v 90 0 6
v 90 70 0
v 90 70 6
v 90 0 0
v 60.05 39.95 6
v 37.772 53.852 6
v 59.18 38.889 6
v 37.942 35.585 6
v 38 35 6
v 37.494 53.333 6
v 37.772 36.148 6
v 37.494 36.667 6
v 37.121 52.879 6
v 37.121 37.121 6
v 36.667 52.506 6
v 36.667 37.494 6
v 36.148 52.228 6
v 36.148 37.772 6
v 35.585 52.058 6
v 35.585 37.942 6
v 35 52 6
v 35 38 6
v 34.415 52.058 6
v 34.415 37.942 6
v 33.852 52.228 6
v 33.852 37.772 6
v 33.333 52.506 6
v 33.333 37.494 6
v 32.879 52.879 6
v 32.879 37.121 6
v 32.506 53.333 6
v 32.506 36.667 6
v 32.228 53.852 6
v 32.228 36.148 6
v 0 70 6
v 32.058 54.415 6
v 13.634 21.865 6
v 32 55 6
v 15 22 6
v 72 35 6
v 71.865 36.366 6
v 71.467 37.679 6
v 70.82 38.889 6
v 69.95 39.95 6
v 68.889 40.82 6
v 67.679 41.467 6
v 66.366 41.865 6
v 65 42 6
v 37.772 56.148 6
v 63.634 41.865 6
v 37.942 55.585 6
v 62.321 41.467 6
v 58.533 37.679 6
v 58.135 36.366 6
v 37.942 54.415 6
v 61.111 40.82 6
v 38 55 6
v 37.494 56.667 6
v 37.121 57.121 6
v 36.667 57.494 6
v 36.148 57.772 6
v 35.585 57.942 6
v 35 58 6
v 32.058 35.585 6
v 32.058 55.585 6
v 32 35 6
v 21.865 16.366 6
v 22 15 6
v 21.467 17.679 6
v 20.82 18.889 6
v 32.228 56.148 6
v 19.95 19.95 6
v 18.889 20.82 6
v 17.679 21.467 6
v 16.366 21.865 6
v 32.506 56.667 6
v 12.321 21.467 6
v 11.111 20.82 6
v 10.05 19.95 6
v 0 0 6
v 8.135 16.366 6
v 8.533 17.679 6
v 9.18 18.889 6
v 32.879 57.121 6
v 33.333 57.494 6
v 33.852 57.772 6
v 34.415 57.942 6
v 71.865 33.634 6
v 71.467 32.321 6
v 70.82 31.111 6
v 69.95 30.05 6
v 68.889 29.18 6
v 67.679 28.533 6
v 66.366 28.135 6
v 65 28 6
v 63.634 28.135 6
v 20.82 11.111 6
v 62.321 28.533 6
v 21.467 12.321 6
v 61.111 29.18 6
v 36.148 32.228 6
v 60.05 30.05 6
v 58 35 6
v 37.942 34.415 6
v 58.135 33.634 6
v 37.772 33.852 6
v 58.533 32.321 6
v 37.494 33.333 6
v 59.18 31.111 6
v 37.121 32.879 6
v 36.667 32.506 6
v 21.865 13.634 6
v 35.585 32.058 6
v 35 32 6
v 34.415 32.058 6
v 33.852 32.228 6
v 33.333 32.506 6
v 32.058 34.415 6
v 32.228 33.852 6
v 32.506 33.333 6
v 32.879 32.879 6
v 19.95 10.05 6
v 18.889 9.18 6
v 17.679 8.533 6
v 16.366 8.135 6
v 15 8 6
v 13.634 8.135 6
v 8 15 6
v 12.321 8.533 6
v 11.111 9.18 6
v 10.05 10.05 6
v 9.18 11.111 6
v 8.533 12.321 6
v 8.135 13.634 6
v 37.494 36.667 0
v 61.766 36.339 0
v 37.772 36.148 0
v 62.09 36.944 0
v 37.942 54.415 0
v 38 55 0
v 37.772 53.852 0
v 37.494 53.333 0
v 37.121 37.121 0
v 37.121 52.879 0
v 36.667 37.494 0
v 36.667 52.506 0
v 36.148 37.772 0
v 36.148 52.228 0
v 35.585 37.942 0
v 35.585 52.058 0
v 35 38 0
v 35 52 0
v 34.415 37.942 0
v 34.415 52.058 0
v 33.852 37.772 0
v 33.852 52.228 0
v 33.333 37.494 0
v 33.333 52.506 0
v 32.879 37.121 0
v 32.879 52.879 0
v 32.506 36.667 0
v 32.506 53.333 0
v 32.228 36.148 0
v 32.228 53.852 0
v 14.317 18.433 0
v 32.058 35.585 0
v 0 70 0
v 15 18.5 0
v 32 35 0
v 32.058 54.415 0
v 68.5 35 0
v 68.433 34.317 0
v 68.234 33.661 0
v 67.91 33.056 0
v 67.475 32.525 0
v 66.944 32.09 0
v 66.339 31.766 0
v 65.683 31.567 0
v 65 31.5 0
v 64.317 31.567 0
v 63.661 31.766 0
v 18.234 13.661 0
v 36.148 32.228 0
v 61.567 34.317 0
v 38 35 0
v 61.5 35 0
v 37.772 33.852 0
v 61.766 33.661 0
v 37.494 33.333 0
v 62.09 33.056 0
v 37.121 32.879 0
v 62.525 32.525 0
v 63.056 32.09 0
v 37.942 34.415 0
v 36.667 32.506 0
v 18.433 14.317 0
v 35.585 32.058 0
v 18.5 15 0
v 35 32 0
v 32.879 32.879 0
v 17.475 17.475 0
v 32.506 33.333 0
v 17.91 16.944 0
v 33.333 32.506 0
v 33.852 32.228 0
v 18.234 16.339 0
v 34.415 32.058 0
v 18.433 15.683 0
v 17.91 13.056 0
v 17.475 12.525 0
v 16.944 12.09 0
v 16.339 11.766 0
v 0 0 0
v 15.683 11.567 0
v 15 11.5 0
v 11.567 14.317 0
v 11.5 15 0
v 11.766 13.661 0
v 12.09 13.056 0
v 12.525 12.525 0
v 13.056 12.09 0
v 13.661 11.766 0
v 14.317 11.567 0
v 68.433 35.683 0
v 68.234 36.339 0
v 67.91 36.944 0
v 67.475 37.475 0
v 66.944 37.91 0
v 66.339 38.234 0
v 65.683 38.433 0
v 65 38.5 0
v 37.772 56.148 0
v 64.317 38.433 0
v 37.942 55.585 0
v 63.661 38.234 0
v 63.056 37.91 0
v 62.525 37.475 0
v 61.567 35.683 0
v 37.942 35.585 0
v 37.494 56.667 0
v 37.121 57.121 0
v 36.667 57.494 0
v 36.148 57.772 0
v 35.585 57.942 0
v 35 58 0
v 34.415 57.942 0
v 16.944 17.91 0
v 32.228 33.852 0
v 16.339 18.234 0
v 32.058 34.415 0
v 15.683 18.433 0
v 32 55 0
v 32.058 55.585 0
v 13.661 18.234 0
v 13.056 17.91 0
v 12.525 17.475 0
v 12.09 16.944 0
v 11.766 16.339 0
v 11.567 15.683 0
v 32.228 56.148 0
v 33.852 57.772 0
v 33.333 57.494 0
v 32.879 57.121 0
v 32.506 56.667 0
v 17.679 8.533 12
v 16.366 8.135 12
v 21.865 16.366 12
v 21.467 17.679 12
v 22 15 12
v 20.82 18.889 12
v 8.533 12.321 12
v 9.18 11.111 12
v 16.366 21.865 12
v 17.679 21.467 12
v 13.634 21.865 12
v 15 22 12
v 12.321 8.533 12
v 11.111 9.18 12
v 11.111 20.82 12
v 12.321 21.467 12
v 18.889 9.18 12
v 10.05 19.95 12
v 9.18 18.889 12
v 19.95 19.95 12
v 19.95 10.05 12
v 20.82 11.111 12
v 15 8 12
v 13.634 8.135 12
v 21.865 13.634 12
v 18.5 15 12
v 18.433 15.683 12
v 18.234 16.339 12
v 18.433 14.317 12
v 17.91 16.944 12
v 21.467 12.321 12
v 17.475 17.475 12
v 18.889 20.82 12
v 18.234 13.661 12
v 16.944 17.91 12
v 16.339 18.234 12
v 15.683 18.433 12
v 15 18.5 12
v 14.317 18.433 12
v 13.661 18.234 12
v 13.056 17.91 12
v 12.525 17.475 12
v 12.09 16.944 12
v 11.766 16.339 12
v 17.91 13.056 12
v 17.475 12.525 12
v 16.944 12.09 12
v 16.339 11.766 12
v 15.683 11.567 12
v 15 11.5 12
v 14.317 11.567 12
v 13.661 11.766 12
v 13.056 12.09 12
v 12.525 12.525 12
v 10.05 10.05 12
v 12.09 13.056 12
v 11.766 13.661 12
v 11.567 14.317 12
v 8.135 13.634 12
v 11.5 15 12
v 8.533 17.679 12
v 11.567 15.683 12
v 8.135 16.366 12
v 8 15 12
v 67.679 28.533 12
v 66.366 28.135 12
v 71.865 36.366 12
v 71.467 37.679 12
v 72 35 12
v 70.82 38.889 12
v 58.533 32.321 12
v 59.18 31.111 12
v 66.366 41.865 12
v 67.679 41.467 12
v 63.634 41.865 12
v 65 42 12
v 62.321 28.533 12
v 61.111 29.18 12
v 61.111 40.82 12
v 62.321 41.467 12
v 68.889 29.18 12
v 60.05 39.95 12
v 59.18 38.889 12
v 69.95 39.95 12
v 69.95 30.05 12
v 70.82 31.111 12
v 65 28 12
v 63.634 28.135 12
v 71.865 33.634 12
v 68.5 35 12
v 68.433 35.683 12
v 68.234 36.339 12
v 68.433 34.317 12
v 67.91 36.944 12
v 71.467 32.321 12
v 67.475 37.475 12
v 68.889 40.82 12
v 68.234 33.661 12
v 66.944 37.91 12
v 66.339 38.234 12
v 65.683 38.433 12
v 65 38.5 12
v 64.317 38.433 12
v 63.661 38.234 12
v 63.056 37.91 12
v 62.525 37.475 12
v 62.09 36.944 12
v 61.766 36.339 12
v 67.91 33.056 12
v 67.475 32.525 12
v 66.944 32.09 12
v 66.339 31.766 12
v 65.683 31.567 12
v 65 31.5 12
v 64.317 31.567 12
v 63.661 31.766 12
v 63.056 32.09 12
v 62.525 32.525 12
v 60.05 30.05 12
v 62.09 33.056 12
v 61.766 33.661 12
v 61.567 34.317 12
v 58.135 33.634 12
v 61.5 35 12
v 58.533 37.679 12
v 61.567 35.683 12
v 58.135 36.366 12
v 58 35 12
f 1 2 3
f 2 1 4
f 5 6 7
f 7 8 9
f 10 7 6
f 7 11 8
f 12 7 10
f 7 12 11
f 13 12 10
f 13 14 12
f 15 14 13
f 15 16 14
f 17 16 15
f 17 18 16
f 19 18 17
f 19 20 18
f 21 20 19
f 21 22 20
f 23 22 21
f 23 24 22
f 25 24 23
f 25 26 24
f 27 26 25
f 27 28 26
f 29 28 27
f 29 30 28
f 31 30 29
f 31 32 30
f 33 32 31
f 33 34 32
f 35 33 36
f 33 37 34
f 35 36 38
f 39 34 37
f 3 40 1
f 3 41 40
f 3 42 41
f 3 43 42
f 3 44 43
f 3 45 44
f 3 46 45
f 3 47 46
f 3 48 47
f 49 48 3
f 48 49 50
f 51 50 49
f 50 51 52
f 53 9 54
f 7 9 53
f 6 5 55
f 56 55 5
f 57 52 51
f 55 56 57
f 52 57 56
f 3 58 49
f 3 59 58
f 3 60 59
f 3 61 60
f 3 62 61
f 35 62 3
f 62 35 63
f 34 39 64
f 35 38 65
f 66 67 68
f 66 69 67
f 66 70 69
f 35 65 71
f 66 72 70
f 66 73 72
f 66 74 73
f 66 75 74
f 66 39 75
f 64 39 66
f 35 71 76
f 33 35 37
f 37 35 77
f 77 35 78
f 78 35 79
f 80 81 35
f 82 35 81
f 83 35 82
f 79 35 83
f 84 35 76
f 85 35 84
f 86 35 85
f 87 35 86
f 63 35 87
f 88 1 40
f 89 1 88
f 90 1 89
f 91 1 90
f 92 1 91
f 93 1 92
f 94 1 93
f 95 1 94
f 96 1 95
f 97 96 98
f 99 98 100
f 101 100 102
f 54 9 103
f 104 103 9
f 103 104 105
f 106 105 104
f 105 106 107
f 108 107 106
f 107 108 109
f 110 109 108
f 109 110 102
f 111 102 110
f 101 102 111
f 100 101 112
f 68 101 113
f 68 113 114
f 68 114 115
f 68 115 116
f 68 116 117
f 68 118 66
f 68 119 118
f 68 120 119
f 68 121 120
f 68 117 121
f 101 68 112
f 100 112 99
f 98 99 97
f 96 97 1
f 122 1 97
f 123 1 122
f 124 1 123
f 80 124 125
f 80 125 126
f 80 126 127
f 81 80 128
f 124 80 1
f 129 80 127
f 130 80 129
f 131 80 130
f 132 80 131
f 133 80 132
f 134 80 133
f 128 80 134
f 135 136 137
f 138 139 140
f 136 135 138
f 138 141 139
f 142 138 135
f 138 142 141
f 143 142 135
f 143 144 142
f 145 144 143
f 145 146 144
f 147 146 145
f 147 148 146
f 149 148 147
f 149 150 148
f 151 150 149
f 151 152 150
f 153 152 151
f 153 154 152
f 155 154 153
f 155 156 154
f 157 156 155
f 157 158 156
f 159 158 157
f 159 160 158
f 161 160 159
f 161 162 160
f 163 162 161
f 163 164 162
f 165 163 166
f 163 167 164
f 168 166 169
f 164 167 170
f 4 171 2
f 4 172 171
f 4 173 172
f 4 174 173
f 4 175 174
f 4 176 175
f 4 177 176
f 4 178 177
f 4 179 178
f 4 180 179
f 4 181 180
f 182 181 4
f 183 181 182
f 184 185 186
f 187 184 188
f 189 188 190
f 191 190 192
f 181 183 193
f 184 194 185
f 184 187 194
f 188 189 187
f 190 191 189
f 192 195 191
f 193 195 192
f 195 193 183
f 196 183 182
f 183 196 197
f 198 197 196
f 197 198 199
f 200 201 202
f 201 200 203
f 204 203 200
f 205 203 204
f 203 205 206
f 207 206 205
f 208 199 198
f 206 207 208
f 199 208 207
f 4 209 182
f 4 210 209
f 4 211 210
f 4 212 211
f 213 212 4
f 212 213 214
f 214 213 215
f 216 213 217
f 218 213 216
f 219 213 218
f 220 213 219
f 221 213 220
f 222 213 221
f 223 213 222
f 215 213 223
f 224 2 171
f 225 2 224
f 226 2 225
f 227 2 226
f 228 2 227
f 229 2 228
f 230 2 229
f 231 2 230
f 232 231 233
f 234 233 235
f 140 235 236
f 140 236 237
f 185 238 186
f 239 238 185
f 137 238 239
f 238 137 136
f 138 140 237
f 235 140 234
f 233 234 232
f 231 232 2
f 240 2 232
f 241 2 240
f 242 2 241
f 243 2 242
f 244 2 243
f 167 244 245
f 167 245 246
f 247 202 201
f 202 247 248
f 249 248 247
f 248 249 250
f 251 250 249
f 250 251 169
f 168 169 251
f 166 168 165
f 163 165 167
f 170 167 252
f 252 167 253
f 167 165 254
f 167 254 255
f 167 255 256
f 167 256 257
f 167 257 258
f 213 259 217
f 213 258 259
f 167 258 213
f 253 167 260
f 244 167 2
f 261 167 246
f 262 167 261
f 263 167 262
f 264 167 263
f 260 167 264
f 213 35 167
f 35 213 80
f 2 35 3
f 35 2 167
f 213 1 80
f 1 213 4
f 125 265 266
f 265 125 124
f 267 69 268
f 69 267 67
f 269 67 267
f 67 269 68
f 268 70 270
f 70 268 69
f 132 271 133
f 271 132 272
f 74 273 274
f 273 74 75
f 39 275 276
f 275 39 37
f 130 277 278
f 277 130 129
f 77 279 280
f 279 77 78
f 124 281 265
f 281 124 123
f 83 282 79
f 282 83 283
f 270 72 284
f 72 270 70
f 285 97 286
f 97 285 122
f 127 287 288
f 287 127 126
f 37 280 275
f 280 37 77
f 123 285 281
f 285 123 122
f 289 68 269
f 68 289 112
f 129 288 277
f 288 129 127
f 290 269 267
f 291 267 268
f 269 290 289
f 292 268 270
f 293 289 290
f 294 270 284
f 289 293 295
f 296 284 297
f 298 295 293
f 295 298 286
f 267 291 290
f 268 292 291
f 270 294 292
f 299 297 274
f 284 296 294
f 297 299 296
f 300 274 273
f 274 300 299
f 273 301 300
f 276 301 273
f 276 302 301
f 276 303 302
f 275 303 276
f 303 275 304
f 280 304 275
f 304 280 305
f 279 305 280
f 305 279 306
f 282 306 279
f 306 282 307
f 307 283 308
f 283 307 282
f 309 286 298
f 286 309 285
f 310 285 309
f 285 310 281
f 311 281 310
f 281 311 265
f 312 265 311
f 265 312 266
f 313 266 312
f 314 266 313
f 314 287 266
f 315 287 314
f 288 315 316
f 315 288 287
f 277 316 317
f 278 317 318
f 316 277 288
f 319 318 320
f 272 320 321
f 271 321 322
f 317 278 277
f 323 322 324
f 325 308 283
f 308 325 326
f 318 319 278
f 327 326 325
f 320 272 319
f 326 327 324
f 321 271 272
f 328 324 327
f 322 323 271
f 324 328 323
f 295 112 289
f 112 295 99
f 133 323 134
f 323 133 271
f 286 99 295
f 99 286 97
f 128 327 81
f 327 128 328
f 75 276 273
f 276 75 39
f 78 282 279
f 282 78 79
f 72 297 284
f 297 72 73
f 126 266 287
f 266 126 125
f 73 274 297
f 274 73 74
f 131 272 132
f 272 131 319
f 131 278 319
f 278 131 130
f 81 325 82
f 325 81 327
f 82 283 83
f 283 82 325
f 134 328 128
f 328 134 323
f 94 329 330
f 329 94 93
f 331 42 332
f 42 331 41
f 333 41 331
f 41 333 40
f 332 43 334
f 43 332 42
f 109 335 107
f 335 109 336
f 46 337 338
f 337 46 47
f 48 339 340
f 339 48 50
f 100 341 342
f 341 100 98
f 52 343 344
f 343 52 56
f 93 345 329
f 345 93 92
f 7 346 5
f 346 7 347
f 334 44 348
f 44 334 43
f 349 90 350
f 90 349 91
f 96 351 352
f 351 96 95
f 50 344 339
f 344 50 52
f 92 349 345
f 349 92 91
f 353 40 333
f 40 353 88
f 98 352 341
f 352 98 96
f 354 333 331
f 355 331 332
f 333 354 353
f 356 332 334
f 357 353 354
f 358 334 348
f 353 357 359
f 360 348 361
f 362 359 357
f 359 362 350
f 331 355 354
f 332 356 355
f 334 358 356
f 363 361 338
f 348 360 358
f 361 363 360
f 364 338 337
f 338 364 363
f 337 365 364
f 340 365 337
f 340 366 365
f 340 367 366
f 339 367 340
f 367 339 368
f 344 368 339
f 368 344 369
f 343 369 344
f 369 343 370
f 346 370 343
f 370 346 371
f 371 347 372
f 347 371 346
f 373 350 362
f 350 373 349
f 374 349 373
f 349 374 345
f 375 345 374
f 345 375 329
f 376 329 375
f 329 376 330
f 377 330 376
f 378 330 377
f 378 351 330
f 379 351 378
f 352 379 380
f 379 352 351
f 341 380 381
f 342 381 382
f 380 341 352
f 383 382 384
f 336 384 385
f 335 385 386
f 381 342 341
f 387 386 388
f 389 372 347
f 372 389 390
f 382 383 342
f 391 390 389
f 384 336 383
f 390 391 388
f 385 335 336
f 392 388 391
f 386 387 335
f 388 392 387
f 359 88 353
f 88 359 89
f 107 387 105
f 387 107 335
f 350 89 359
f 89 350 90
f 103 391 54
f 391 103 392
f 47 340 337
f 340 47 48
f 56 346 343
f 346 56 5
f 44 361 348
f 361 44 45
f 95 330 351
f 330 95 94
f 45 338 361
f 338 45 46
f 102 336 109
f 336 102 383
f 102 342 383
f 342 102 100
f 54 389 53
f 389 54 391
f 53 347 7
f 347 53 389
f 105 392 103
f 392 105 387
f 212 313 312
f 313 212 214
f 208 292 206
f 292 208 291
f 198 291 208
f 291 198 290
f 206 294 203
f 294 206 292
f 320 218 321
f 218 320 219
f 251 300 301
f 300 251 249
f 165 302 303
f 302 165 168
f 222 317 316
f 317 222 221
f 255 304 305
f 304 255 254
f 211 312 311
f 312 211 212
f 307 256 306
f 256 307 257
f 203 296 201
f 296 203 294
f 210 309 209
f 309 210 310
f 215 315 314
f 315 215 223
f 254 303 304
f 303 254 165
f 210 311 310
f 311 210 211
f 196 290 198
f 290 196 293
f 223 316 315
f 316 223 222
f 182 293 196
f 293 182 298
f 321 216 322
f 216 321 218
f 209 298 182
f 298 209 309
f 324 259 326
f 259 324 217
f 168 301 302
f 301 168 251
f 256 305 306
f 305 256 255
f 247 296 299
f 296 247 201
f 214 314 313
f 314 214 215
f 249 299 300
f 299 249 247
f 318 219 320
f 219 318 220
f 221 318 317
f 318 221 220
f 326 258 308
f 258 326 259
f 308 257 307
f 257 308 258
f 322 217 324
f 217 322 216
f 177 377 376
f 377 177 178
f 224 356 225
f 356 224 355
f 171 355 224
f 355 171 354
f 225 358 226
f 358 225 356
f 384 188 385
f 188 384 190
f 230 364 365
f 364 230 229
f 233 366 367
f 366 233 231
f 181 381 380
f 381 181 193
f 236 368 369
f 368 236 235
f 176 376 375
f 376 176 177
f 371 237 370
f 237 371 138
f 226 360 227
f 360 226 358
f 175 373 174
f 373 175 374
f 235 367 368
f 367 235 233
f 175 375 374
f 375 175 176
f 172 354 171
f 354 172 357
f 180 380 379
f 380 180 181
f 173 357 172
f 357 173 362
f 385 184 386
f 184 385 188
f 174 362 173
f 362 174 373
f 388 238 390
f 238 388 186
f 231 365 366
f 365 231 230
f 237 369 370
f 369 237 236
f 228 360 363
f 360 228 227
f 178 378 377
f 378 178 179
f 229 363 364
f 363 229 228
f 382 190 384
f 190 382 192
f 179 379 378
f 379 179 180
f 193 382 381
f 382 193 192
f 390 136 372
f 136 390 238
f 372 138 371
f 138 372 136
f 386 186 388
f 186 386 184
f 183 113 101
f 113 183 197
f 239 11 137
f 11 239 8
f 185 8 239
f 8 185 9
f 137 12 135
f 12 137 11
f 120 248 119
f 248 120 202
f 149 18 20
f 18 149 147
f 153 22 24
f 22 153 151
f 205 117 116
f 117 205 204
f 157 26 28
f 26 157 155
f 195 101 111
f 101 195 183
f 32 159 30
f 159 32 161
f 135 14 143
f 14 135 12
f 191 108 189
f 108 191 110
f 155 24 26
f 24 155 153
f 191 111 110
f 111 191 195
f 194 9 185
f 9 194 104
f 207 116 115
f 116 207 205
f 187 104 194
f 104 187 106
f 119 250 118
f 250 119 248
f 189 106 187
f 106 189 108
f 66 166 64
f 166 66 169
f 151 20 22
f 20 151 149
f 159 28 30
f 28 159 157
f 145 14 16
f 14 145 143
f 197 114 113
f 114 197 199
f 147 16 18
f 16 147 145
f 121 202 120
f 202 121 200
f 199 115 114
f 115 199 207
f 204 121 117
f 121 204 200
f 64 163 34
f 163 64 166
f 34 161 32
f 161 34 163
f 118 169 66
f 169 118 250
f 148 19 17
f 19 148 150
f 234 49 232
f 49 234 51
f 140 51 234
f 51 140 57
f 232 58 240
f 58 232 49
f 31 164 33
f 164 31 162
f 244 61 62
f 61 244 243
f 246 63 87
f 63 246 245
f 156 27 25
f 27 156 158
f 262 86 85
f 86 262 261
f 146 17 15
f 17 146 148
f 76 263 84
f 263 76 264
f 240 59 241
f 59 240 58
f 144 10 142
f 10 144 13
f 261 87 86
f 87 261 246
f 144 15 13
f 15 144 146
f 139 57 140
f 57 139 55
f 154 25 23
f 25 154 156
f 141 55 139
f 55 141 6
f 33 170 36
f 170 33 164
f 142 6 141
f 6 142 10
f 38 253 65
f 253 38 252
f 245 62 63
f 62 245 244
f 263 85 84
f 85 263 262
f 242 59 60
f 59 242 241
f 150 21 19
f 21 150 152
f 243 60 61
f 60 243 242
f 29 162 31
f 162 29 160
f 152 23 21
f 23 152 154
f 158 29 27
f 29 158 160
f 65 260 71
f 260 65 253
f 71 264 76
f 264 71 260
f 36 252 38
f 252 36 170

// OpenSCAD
$fn = 32;

// ----------------------------------------------------------------------
// Mixed field: bosses and holes at given coordinates
// ----------------------------------------------------------------------

// --- parameters (mm) ---
plate_l = 90;             // plate length, X
plate_w = 70;             // plate width, Y
plate_t = 6;              // plate thickness, Z
boss_d = 14;              // boss diameter
boss_h = 6;               // boss height above the plate
hole_d = 6;               // through hole diameter

total_h = plate_t + boss_h;  // overall height

difference() {
  union() {
    cube([plate_l, plate_w, plate_t]);
    translate([15, 15, plate_t]) cylinder(h = boss_h, d = boss_d);
    translate([65, 35, plate_t]) cylinder(h = boss_h, d = boss_d);
  }
  translate([15, 15, -1]) cylinder(h = total_h + 2, d = boss_d / 2);
  translate([65, 35, -1]) cylinder(h = total_h + 2, d = boss_d / 2);
  translate([35, 35, -1]) cylinder(h = plate_t + 2, d = hole_d);
  translate([35, 55, -1]) cylinder(h = plate_t + 2, d = hole_d);
}
